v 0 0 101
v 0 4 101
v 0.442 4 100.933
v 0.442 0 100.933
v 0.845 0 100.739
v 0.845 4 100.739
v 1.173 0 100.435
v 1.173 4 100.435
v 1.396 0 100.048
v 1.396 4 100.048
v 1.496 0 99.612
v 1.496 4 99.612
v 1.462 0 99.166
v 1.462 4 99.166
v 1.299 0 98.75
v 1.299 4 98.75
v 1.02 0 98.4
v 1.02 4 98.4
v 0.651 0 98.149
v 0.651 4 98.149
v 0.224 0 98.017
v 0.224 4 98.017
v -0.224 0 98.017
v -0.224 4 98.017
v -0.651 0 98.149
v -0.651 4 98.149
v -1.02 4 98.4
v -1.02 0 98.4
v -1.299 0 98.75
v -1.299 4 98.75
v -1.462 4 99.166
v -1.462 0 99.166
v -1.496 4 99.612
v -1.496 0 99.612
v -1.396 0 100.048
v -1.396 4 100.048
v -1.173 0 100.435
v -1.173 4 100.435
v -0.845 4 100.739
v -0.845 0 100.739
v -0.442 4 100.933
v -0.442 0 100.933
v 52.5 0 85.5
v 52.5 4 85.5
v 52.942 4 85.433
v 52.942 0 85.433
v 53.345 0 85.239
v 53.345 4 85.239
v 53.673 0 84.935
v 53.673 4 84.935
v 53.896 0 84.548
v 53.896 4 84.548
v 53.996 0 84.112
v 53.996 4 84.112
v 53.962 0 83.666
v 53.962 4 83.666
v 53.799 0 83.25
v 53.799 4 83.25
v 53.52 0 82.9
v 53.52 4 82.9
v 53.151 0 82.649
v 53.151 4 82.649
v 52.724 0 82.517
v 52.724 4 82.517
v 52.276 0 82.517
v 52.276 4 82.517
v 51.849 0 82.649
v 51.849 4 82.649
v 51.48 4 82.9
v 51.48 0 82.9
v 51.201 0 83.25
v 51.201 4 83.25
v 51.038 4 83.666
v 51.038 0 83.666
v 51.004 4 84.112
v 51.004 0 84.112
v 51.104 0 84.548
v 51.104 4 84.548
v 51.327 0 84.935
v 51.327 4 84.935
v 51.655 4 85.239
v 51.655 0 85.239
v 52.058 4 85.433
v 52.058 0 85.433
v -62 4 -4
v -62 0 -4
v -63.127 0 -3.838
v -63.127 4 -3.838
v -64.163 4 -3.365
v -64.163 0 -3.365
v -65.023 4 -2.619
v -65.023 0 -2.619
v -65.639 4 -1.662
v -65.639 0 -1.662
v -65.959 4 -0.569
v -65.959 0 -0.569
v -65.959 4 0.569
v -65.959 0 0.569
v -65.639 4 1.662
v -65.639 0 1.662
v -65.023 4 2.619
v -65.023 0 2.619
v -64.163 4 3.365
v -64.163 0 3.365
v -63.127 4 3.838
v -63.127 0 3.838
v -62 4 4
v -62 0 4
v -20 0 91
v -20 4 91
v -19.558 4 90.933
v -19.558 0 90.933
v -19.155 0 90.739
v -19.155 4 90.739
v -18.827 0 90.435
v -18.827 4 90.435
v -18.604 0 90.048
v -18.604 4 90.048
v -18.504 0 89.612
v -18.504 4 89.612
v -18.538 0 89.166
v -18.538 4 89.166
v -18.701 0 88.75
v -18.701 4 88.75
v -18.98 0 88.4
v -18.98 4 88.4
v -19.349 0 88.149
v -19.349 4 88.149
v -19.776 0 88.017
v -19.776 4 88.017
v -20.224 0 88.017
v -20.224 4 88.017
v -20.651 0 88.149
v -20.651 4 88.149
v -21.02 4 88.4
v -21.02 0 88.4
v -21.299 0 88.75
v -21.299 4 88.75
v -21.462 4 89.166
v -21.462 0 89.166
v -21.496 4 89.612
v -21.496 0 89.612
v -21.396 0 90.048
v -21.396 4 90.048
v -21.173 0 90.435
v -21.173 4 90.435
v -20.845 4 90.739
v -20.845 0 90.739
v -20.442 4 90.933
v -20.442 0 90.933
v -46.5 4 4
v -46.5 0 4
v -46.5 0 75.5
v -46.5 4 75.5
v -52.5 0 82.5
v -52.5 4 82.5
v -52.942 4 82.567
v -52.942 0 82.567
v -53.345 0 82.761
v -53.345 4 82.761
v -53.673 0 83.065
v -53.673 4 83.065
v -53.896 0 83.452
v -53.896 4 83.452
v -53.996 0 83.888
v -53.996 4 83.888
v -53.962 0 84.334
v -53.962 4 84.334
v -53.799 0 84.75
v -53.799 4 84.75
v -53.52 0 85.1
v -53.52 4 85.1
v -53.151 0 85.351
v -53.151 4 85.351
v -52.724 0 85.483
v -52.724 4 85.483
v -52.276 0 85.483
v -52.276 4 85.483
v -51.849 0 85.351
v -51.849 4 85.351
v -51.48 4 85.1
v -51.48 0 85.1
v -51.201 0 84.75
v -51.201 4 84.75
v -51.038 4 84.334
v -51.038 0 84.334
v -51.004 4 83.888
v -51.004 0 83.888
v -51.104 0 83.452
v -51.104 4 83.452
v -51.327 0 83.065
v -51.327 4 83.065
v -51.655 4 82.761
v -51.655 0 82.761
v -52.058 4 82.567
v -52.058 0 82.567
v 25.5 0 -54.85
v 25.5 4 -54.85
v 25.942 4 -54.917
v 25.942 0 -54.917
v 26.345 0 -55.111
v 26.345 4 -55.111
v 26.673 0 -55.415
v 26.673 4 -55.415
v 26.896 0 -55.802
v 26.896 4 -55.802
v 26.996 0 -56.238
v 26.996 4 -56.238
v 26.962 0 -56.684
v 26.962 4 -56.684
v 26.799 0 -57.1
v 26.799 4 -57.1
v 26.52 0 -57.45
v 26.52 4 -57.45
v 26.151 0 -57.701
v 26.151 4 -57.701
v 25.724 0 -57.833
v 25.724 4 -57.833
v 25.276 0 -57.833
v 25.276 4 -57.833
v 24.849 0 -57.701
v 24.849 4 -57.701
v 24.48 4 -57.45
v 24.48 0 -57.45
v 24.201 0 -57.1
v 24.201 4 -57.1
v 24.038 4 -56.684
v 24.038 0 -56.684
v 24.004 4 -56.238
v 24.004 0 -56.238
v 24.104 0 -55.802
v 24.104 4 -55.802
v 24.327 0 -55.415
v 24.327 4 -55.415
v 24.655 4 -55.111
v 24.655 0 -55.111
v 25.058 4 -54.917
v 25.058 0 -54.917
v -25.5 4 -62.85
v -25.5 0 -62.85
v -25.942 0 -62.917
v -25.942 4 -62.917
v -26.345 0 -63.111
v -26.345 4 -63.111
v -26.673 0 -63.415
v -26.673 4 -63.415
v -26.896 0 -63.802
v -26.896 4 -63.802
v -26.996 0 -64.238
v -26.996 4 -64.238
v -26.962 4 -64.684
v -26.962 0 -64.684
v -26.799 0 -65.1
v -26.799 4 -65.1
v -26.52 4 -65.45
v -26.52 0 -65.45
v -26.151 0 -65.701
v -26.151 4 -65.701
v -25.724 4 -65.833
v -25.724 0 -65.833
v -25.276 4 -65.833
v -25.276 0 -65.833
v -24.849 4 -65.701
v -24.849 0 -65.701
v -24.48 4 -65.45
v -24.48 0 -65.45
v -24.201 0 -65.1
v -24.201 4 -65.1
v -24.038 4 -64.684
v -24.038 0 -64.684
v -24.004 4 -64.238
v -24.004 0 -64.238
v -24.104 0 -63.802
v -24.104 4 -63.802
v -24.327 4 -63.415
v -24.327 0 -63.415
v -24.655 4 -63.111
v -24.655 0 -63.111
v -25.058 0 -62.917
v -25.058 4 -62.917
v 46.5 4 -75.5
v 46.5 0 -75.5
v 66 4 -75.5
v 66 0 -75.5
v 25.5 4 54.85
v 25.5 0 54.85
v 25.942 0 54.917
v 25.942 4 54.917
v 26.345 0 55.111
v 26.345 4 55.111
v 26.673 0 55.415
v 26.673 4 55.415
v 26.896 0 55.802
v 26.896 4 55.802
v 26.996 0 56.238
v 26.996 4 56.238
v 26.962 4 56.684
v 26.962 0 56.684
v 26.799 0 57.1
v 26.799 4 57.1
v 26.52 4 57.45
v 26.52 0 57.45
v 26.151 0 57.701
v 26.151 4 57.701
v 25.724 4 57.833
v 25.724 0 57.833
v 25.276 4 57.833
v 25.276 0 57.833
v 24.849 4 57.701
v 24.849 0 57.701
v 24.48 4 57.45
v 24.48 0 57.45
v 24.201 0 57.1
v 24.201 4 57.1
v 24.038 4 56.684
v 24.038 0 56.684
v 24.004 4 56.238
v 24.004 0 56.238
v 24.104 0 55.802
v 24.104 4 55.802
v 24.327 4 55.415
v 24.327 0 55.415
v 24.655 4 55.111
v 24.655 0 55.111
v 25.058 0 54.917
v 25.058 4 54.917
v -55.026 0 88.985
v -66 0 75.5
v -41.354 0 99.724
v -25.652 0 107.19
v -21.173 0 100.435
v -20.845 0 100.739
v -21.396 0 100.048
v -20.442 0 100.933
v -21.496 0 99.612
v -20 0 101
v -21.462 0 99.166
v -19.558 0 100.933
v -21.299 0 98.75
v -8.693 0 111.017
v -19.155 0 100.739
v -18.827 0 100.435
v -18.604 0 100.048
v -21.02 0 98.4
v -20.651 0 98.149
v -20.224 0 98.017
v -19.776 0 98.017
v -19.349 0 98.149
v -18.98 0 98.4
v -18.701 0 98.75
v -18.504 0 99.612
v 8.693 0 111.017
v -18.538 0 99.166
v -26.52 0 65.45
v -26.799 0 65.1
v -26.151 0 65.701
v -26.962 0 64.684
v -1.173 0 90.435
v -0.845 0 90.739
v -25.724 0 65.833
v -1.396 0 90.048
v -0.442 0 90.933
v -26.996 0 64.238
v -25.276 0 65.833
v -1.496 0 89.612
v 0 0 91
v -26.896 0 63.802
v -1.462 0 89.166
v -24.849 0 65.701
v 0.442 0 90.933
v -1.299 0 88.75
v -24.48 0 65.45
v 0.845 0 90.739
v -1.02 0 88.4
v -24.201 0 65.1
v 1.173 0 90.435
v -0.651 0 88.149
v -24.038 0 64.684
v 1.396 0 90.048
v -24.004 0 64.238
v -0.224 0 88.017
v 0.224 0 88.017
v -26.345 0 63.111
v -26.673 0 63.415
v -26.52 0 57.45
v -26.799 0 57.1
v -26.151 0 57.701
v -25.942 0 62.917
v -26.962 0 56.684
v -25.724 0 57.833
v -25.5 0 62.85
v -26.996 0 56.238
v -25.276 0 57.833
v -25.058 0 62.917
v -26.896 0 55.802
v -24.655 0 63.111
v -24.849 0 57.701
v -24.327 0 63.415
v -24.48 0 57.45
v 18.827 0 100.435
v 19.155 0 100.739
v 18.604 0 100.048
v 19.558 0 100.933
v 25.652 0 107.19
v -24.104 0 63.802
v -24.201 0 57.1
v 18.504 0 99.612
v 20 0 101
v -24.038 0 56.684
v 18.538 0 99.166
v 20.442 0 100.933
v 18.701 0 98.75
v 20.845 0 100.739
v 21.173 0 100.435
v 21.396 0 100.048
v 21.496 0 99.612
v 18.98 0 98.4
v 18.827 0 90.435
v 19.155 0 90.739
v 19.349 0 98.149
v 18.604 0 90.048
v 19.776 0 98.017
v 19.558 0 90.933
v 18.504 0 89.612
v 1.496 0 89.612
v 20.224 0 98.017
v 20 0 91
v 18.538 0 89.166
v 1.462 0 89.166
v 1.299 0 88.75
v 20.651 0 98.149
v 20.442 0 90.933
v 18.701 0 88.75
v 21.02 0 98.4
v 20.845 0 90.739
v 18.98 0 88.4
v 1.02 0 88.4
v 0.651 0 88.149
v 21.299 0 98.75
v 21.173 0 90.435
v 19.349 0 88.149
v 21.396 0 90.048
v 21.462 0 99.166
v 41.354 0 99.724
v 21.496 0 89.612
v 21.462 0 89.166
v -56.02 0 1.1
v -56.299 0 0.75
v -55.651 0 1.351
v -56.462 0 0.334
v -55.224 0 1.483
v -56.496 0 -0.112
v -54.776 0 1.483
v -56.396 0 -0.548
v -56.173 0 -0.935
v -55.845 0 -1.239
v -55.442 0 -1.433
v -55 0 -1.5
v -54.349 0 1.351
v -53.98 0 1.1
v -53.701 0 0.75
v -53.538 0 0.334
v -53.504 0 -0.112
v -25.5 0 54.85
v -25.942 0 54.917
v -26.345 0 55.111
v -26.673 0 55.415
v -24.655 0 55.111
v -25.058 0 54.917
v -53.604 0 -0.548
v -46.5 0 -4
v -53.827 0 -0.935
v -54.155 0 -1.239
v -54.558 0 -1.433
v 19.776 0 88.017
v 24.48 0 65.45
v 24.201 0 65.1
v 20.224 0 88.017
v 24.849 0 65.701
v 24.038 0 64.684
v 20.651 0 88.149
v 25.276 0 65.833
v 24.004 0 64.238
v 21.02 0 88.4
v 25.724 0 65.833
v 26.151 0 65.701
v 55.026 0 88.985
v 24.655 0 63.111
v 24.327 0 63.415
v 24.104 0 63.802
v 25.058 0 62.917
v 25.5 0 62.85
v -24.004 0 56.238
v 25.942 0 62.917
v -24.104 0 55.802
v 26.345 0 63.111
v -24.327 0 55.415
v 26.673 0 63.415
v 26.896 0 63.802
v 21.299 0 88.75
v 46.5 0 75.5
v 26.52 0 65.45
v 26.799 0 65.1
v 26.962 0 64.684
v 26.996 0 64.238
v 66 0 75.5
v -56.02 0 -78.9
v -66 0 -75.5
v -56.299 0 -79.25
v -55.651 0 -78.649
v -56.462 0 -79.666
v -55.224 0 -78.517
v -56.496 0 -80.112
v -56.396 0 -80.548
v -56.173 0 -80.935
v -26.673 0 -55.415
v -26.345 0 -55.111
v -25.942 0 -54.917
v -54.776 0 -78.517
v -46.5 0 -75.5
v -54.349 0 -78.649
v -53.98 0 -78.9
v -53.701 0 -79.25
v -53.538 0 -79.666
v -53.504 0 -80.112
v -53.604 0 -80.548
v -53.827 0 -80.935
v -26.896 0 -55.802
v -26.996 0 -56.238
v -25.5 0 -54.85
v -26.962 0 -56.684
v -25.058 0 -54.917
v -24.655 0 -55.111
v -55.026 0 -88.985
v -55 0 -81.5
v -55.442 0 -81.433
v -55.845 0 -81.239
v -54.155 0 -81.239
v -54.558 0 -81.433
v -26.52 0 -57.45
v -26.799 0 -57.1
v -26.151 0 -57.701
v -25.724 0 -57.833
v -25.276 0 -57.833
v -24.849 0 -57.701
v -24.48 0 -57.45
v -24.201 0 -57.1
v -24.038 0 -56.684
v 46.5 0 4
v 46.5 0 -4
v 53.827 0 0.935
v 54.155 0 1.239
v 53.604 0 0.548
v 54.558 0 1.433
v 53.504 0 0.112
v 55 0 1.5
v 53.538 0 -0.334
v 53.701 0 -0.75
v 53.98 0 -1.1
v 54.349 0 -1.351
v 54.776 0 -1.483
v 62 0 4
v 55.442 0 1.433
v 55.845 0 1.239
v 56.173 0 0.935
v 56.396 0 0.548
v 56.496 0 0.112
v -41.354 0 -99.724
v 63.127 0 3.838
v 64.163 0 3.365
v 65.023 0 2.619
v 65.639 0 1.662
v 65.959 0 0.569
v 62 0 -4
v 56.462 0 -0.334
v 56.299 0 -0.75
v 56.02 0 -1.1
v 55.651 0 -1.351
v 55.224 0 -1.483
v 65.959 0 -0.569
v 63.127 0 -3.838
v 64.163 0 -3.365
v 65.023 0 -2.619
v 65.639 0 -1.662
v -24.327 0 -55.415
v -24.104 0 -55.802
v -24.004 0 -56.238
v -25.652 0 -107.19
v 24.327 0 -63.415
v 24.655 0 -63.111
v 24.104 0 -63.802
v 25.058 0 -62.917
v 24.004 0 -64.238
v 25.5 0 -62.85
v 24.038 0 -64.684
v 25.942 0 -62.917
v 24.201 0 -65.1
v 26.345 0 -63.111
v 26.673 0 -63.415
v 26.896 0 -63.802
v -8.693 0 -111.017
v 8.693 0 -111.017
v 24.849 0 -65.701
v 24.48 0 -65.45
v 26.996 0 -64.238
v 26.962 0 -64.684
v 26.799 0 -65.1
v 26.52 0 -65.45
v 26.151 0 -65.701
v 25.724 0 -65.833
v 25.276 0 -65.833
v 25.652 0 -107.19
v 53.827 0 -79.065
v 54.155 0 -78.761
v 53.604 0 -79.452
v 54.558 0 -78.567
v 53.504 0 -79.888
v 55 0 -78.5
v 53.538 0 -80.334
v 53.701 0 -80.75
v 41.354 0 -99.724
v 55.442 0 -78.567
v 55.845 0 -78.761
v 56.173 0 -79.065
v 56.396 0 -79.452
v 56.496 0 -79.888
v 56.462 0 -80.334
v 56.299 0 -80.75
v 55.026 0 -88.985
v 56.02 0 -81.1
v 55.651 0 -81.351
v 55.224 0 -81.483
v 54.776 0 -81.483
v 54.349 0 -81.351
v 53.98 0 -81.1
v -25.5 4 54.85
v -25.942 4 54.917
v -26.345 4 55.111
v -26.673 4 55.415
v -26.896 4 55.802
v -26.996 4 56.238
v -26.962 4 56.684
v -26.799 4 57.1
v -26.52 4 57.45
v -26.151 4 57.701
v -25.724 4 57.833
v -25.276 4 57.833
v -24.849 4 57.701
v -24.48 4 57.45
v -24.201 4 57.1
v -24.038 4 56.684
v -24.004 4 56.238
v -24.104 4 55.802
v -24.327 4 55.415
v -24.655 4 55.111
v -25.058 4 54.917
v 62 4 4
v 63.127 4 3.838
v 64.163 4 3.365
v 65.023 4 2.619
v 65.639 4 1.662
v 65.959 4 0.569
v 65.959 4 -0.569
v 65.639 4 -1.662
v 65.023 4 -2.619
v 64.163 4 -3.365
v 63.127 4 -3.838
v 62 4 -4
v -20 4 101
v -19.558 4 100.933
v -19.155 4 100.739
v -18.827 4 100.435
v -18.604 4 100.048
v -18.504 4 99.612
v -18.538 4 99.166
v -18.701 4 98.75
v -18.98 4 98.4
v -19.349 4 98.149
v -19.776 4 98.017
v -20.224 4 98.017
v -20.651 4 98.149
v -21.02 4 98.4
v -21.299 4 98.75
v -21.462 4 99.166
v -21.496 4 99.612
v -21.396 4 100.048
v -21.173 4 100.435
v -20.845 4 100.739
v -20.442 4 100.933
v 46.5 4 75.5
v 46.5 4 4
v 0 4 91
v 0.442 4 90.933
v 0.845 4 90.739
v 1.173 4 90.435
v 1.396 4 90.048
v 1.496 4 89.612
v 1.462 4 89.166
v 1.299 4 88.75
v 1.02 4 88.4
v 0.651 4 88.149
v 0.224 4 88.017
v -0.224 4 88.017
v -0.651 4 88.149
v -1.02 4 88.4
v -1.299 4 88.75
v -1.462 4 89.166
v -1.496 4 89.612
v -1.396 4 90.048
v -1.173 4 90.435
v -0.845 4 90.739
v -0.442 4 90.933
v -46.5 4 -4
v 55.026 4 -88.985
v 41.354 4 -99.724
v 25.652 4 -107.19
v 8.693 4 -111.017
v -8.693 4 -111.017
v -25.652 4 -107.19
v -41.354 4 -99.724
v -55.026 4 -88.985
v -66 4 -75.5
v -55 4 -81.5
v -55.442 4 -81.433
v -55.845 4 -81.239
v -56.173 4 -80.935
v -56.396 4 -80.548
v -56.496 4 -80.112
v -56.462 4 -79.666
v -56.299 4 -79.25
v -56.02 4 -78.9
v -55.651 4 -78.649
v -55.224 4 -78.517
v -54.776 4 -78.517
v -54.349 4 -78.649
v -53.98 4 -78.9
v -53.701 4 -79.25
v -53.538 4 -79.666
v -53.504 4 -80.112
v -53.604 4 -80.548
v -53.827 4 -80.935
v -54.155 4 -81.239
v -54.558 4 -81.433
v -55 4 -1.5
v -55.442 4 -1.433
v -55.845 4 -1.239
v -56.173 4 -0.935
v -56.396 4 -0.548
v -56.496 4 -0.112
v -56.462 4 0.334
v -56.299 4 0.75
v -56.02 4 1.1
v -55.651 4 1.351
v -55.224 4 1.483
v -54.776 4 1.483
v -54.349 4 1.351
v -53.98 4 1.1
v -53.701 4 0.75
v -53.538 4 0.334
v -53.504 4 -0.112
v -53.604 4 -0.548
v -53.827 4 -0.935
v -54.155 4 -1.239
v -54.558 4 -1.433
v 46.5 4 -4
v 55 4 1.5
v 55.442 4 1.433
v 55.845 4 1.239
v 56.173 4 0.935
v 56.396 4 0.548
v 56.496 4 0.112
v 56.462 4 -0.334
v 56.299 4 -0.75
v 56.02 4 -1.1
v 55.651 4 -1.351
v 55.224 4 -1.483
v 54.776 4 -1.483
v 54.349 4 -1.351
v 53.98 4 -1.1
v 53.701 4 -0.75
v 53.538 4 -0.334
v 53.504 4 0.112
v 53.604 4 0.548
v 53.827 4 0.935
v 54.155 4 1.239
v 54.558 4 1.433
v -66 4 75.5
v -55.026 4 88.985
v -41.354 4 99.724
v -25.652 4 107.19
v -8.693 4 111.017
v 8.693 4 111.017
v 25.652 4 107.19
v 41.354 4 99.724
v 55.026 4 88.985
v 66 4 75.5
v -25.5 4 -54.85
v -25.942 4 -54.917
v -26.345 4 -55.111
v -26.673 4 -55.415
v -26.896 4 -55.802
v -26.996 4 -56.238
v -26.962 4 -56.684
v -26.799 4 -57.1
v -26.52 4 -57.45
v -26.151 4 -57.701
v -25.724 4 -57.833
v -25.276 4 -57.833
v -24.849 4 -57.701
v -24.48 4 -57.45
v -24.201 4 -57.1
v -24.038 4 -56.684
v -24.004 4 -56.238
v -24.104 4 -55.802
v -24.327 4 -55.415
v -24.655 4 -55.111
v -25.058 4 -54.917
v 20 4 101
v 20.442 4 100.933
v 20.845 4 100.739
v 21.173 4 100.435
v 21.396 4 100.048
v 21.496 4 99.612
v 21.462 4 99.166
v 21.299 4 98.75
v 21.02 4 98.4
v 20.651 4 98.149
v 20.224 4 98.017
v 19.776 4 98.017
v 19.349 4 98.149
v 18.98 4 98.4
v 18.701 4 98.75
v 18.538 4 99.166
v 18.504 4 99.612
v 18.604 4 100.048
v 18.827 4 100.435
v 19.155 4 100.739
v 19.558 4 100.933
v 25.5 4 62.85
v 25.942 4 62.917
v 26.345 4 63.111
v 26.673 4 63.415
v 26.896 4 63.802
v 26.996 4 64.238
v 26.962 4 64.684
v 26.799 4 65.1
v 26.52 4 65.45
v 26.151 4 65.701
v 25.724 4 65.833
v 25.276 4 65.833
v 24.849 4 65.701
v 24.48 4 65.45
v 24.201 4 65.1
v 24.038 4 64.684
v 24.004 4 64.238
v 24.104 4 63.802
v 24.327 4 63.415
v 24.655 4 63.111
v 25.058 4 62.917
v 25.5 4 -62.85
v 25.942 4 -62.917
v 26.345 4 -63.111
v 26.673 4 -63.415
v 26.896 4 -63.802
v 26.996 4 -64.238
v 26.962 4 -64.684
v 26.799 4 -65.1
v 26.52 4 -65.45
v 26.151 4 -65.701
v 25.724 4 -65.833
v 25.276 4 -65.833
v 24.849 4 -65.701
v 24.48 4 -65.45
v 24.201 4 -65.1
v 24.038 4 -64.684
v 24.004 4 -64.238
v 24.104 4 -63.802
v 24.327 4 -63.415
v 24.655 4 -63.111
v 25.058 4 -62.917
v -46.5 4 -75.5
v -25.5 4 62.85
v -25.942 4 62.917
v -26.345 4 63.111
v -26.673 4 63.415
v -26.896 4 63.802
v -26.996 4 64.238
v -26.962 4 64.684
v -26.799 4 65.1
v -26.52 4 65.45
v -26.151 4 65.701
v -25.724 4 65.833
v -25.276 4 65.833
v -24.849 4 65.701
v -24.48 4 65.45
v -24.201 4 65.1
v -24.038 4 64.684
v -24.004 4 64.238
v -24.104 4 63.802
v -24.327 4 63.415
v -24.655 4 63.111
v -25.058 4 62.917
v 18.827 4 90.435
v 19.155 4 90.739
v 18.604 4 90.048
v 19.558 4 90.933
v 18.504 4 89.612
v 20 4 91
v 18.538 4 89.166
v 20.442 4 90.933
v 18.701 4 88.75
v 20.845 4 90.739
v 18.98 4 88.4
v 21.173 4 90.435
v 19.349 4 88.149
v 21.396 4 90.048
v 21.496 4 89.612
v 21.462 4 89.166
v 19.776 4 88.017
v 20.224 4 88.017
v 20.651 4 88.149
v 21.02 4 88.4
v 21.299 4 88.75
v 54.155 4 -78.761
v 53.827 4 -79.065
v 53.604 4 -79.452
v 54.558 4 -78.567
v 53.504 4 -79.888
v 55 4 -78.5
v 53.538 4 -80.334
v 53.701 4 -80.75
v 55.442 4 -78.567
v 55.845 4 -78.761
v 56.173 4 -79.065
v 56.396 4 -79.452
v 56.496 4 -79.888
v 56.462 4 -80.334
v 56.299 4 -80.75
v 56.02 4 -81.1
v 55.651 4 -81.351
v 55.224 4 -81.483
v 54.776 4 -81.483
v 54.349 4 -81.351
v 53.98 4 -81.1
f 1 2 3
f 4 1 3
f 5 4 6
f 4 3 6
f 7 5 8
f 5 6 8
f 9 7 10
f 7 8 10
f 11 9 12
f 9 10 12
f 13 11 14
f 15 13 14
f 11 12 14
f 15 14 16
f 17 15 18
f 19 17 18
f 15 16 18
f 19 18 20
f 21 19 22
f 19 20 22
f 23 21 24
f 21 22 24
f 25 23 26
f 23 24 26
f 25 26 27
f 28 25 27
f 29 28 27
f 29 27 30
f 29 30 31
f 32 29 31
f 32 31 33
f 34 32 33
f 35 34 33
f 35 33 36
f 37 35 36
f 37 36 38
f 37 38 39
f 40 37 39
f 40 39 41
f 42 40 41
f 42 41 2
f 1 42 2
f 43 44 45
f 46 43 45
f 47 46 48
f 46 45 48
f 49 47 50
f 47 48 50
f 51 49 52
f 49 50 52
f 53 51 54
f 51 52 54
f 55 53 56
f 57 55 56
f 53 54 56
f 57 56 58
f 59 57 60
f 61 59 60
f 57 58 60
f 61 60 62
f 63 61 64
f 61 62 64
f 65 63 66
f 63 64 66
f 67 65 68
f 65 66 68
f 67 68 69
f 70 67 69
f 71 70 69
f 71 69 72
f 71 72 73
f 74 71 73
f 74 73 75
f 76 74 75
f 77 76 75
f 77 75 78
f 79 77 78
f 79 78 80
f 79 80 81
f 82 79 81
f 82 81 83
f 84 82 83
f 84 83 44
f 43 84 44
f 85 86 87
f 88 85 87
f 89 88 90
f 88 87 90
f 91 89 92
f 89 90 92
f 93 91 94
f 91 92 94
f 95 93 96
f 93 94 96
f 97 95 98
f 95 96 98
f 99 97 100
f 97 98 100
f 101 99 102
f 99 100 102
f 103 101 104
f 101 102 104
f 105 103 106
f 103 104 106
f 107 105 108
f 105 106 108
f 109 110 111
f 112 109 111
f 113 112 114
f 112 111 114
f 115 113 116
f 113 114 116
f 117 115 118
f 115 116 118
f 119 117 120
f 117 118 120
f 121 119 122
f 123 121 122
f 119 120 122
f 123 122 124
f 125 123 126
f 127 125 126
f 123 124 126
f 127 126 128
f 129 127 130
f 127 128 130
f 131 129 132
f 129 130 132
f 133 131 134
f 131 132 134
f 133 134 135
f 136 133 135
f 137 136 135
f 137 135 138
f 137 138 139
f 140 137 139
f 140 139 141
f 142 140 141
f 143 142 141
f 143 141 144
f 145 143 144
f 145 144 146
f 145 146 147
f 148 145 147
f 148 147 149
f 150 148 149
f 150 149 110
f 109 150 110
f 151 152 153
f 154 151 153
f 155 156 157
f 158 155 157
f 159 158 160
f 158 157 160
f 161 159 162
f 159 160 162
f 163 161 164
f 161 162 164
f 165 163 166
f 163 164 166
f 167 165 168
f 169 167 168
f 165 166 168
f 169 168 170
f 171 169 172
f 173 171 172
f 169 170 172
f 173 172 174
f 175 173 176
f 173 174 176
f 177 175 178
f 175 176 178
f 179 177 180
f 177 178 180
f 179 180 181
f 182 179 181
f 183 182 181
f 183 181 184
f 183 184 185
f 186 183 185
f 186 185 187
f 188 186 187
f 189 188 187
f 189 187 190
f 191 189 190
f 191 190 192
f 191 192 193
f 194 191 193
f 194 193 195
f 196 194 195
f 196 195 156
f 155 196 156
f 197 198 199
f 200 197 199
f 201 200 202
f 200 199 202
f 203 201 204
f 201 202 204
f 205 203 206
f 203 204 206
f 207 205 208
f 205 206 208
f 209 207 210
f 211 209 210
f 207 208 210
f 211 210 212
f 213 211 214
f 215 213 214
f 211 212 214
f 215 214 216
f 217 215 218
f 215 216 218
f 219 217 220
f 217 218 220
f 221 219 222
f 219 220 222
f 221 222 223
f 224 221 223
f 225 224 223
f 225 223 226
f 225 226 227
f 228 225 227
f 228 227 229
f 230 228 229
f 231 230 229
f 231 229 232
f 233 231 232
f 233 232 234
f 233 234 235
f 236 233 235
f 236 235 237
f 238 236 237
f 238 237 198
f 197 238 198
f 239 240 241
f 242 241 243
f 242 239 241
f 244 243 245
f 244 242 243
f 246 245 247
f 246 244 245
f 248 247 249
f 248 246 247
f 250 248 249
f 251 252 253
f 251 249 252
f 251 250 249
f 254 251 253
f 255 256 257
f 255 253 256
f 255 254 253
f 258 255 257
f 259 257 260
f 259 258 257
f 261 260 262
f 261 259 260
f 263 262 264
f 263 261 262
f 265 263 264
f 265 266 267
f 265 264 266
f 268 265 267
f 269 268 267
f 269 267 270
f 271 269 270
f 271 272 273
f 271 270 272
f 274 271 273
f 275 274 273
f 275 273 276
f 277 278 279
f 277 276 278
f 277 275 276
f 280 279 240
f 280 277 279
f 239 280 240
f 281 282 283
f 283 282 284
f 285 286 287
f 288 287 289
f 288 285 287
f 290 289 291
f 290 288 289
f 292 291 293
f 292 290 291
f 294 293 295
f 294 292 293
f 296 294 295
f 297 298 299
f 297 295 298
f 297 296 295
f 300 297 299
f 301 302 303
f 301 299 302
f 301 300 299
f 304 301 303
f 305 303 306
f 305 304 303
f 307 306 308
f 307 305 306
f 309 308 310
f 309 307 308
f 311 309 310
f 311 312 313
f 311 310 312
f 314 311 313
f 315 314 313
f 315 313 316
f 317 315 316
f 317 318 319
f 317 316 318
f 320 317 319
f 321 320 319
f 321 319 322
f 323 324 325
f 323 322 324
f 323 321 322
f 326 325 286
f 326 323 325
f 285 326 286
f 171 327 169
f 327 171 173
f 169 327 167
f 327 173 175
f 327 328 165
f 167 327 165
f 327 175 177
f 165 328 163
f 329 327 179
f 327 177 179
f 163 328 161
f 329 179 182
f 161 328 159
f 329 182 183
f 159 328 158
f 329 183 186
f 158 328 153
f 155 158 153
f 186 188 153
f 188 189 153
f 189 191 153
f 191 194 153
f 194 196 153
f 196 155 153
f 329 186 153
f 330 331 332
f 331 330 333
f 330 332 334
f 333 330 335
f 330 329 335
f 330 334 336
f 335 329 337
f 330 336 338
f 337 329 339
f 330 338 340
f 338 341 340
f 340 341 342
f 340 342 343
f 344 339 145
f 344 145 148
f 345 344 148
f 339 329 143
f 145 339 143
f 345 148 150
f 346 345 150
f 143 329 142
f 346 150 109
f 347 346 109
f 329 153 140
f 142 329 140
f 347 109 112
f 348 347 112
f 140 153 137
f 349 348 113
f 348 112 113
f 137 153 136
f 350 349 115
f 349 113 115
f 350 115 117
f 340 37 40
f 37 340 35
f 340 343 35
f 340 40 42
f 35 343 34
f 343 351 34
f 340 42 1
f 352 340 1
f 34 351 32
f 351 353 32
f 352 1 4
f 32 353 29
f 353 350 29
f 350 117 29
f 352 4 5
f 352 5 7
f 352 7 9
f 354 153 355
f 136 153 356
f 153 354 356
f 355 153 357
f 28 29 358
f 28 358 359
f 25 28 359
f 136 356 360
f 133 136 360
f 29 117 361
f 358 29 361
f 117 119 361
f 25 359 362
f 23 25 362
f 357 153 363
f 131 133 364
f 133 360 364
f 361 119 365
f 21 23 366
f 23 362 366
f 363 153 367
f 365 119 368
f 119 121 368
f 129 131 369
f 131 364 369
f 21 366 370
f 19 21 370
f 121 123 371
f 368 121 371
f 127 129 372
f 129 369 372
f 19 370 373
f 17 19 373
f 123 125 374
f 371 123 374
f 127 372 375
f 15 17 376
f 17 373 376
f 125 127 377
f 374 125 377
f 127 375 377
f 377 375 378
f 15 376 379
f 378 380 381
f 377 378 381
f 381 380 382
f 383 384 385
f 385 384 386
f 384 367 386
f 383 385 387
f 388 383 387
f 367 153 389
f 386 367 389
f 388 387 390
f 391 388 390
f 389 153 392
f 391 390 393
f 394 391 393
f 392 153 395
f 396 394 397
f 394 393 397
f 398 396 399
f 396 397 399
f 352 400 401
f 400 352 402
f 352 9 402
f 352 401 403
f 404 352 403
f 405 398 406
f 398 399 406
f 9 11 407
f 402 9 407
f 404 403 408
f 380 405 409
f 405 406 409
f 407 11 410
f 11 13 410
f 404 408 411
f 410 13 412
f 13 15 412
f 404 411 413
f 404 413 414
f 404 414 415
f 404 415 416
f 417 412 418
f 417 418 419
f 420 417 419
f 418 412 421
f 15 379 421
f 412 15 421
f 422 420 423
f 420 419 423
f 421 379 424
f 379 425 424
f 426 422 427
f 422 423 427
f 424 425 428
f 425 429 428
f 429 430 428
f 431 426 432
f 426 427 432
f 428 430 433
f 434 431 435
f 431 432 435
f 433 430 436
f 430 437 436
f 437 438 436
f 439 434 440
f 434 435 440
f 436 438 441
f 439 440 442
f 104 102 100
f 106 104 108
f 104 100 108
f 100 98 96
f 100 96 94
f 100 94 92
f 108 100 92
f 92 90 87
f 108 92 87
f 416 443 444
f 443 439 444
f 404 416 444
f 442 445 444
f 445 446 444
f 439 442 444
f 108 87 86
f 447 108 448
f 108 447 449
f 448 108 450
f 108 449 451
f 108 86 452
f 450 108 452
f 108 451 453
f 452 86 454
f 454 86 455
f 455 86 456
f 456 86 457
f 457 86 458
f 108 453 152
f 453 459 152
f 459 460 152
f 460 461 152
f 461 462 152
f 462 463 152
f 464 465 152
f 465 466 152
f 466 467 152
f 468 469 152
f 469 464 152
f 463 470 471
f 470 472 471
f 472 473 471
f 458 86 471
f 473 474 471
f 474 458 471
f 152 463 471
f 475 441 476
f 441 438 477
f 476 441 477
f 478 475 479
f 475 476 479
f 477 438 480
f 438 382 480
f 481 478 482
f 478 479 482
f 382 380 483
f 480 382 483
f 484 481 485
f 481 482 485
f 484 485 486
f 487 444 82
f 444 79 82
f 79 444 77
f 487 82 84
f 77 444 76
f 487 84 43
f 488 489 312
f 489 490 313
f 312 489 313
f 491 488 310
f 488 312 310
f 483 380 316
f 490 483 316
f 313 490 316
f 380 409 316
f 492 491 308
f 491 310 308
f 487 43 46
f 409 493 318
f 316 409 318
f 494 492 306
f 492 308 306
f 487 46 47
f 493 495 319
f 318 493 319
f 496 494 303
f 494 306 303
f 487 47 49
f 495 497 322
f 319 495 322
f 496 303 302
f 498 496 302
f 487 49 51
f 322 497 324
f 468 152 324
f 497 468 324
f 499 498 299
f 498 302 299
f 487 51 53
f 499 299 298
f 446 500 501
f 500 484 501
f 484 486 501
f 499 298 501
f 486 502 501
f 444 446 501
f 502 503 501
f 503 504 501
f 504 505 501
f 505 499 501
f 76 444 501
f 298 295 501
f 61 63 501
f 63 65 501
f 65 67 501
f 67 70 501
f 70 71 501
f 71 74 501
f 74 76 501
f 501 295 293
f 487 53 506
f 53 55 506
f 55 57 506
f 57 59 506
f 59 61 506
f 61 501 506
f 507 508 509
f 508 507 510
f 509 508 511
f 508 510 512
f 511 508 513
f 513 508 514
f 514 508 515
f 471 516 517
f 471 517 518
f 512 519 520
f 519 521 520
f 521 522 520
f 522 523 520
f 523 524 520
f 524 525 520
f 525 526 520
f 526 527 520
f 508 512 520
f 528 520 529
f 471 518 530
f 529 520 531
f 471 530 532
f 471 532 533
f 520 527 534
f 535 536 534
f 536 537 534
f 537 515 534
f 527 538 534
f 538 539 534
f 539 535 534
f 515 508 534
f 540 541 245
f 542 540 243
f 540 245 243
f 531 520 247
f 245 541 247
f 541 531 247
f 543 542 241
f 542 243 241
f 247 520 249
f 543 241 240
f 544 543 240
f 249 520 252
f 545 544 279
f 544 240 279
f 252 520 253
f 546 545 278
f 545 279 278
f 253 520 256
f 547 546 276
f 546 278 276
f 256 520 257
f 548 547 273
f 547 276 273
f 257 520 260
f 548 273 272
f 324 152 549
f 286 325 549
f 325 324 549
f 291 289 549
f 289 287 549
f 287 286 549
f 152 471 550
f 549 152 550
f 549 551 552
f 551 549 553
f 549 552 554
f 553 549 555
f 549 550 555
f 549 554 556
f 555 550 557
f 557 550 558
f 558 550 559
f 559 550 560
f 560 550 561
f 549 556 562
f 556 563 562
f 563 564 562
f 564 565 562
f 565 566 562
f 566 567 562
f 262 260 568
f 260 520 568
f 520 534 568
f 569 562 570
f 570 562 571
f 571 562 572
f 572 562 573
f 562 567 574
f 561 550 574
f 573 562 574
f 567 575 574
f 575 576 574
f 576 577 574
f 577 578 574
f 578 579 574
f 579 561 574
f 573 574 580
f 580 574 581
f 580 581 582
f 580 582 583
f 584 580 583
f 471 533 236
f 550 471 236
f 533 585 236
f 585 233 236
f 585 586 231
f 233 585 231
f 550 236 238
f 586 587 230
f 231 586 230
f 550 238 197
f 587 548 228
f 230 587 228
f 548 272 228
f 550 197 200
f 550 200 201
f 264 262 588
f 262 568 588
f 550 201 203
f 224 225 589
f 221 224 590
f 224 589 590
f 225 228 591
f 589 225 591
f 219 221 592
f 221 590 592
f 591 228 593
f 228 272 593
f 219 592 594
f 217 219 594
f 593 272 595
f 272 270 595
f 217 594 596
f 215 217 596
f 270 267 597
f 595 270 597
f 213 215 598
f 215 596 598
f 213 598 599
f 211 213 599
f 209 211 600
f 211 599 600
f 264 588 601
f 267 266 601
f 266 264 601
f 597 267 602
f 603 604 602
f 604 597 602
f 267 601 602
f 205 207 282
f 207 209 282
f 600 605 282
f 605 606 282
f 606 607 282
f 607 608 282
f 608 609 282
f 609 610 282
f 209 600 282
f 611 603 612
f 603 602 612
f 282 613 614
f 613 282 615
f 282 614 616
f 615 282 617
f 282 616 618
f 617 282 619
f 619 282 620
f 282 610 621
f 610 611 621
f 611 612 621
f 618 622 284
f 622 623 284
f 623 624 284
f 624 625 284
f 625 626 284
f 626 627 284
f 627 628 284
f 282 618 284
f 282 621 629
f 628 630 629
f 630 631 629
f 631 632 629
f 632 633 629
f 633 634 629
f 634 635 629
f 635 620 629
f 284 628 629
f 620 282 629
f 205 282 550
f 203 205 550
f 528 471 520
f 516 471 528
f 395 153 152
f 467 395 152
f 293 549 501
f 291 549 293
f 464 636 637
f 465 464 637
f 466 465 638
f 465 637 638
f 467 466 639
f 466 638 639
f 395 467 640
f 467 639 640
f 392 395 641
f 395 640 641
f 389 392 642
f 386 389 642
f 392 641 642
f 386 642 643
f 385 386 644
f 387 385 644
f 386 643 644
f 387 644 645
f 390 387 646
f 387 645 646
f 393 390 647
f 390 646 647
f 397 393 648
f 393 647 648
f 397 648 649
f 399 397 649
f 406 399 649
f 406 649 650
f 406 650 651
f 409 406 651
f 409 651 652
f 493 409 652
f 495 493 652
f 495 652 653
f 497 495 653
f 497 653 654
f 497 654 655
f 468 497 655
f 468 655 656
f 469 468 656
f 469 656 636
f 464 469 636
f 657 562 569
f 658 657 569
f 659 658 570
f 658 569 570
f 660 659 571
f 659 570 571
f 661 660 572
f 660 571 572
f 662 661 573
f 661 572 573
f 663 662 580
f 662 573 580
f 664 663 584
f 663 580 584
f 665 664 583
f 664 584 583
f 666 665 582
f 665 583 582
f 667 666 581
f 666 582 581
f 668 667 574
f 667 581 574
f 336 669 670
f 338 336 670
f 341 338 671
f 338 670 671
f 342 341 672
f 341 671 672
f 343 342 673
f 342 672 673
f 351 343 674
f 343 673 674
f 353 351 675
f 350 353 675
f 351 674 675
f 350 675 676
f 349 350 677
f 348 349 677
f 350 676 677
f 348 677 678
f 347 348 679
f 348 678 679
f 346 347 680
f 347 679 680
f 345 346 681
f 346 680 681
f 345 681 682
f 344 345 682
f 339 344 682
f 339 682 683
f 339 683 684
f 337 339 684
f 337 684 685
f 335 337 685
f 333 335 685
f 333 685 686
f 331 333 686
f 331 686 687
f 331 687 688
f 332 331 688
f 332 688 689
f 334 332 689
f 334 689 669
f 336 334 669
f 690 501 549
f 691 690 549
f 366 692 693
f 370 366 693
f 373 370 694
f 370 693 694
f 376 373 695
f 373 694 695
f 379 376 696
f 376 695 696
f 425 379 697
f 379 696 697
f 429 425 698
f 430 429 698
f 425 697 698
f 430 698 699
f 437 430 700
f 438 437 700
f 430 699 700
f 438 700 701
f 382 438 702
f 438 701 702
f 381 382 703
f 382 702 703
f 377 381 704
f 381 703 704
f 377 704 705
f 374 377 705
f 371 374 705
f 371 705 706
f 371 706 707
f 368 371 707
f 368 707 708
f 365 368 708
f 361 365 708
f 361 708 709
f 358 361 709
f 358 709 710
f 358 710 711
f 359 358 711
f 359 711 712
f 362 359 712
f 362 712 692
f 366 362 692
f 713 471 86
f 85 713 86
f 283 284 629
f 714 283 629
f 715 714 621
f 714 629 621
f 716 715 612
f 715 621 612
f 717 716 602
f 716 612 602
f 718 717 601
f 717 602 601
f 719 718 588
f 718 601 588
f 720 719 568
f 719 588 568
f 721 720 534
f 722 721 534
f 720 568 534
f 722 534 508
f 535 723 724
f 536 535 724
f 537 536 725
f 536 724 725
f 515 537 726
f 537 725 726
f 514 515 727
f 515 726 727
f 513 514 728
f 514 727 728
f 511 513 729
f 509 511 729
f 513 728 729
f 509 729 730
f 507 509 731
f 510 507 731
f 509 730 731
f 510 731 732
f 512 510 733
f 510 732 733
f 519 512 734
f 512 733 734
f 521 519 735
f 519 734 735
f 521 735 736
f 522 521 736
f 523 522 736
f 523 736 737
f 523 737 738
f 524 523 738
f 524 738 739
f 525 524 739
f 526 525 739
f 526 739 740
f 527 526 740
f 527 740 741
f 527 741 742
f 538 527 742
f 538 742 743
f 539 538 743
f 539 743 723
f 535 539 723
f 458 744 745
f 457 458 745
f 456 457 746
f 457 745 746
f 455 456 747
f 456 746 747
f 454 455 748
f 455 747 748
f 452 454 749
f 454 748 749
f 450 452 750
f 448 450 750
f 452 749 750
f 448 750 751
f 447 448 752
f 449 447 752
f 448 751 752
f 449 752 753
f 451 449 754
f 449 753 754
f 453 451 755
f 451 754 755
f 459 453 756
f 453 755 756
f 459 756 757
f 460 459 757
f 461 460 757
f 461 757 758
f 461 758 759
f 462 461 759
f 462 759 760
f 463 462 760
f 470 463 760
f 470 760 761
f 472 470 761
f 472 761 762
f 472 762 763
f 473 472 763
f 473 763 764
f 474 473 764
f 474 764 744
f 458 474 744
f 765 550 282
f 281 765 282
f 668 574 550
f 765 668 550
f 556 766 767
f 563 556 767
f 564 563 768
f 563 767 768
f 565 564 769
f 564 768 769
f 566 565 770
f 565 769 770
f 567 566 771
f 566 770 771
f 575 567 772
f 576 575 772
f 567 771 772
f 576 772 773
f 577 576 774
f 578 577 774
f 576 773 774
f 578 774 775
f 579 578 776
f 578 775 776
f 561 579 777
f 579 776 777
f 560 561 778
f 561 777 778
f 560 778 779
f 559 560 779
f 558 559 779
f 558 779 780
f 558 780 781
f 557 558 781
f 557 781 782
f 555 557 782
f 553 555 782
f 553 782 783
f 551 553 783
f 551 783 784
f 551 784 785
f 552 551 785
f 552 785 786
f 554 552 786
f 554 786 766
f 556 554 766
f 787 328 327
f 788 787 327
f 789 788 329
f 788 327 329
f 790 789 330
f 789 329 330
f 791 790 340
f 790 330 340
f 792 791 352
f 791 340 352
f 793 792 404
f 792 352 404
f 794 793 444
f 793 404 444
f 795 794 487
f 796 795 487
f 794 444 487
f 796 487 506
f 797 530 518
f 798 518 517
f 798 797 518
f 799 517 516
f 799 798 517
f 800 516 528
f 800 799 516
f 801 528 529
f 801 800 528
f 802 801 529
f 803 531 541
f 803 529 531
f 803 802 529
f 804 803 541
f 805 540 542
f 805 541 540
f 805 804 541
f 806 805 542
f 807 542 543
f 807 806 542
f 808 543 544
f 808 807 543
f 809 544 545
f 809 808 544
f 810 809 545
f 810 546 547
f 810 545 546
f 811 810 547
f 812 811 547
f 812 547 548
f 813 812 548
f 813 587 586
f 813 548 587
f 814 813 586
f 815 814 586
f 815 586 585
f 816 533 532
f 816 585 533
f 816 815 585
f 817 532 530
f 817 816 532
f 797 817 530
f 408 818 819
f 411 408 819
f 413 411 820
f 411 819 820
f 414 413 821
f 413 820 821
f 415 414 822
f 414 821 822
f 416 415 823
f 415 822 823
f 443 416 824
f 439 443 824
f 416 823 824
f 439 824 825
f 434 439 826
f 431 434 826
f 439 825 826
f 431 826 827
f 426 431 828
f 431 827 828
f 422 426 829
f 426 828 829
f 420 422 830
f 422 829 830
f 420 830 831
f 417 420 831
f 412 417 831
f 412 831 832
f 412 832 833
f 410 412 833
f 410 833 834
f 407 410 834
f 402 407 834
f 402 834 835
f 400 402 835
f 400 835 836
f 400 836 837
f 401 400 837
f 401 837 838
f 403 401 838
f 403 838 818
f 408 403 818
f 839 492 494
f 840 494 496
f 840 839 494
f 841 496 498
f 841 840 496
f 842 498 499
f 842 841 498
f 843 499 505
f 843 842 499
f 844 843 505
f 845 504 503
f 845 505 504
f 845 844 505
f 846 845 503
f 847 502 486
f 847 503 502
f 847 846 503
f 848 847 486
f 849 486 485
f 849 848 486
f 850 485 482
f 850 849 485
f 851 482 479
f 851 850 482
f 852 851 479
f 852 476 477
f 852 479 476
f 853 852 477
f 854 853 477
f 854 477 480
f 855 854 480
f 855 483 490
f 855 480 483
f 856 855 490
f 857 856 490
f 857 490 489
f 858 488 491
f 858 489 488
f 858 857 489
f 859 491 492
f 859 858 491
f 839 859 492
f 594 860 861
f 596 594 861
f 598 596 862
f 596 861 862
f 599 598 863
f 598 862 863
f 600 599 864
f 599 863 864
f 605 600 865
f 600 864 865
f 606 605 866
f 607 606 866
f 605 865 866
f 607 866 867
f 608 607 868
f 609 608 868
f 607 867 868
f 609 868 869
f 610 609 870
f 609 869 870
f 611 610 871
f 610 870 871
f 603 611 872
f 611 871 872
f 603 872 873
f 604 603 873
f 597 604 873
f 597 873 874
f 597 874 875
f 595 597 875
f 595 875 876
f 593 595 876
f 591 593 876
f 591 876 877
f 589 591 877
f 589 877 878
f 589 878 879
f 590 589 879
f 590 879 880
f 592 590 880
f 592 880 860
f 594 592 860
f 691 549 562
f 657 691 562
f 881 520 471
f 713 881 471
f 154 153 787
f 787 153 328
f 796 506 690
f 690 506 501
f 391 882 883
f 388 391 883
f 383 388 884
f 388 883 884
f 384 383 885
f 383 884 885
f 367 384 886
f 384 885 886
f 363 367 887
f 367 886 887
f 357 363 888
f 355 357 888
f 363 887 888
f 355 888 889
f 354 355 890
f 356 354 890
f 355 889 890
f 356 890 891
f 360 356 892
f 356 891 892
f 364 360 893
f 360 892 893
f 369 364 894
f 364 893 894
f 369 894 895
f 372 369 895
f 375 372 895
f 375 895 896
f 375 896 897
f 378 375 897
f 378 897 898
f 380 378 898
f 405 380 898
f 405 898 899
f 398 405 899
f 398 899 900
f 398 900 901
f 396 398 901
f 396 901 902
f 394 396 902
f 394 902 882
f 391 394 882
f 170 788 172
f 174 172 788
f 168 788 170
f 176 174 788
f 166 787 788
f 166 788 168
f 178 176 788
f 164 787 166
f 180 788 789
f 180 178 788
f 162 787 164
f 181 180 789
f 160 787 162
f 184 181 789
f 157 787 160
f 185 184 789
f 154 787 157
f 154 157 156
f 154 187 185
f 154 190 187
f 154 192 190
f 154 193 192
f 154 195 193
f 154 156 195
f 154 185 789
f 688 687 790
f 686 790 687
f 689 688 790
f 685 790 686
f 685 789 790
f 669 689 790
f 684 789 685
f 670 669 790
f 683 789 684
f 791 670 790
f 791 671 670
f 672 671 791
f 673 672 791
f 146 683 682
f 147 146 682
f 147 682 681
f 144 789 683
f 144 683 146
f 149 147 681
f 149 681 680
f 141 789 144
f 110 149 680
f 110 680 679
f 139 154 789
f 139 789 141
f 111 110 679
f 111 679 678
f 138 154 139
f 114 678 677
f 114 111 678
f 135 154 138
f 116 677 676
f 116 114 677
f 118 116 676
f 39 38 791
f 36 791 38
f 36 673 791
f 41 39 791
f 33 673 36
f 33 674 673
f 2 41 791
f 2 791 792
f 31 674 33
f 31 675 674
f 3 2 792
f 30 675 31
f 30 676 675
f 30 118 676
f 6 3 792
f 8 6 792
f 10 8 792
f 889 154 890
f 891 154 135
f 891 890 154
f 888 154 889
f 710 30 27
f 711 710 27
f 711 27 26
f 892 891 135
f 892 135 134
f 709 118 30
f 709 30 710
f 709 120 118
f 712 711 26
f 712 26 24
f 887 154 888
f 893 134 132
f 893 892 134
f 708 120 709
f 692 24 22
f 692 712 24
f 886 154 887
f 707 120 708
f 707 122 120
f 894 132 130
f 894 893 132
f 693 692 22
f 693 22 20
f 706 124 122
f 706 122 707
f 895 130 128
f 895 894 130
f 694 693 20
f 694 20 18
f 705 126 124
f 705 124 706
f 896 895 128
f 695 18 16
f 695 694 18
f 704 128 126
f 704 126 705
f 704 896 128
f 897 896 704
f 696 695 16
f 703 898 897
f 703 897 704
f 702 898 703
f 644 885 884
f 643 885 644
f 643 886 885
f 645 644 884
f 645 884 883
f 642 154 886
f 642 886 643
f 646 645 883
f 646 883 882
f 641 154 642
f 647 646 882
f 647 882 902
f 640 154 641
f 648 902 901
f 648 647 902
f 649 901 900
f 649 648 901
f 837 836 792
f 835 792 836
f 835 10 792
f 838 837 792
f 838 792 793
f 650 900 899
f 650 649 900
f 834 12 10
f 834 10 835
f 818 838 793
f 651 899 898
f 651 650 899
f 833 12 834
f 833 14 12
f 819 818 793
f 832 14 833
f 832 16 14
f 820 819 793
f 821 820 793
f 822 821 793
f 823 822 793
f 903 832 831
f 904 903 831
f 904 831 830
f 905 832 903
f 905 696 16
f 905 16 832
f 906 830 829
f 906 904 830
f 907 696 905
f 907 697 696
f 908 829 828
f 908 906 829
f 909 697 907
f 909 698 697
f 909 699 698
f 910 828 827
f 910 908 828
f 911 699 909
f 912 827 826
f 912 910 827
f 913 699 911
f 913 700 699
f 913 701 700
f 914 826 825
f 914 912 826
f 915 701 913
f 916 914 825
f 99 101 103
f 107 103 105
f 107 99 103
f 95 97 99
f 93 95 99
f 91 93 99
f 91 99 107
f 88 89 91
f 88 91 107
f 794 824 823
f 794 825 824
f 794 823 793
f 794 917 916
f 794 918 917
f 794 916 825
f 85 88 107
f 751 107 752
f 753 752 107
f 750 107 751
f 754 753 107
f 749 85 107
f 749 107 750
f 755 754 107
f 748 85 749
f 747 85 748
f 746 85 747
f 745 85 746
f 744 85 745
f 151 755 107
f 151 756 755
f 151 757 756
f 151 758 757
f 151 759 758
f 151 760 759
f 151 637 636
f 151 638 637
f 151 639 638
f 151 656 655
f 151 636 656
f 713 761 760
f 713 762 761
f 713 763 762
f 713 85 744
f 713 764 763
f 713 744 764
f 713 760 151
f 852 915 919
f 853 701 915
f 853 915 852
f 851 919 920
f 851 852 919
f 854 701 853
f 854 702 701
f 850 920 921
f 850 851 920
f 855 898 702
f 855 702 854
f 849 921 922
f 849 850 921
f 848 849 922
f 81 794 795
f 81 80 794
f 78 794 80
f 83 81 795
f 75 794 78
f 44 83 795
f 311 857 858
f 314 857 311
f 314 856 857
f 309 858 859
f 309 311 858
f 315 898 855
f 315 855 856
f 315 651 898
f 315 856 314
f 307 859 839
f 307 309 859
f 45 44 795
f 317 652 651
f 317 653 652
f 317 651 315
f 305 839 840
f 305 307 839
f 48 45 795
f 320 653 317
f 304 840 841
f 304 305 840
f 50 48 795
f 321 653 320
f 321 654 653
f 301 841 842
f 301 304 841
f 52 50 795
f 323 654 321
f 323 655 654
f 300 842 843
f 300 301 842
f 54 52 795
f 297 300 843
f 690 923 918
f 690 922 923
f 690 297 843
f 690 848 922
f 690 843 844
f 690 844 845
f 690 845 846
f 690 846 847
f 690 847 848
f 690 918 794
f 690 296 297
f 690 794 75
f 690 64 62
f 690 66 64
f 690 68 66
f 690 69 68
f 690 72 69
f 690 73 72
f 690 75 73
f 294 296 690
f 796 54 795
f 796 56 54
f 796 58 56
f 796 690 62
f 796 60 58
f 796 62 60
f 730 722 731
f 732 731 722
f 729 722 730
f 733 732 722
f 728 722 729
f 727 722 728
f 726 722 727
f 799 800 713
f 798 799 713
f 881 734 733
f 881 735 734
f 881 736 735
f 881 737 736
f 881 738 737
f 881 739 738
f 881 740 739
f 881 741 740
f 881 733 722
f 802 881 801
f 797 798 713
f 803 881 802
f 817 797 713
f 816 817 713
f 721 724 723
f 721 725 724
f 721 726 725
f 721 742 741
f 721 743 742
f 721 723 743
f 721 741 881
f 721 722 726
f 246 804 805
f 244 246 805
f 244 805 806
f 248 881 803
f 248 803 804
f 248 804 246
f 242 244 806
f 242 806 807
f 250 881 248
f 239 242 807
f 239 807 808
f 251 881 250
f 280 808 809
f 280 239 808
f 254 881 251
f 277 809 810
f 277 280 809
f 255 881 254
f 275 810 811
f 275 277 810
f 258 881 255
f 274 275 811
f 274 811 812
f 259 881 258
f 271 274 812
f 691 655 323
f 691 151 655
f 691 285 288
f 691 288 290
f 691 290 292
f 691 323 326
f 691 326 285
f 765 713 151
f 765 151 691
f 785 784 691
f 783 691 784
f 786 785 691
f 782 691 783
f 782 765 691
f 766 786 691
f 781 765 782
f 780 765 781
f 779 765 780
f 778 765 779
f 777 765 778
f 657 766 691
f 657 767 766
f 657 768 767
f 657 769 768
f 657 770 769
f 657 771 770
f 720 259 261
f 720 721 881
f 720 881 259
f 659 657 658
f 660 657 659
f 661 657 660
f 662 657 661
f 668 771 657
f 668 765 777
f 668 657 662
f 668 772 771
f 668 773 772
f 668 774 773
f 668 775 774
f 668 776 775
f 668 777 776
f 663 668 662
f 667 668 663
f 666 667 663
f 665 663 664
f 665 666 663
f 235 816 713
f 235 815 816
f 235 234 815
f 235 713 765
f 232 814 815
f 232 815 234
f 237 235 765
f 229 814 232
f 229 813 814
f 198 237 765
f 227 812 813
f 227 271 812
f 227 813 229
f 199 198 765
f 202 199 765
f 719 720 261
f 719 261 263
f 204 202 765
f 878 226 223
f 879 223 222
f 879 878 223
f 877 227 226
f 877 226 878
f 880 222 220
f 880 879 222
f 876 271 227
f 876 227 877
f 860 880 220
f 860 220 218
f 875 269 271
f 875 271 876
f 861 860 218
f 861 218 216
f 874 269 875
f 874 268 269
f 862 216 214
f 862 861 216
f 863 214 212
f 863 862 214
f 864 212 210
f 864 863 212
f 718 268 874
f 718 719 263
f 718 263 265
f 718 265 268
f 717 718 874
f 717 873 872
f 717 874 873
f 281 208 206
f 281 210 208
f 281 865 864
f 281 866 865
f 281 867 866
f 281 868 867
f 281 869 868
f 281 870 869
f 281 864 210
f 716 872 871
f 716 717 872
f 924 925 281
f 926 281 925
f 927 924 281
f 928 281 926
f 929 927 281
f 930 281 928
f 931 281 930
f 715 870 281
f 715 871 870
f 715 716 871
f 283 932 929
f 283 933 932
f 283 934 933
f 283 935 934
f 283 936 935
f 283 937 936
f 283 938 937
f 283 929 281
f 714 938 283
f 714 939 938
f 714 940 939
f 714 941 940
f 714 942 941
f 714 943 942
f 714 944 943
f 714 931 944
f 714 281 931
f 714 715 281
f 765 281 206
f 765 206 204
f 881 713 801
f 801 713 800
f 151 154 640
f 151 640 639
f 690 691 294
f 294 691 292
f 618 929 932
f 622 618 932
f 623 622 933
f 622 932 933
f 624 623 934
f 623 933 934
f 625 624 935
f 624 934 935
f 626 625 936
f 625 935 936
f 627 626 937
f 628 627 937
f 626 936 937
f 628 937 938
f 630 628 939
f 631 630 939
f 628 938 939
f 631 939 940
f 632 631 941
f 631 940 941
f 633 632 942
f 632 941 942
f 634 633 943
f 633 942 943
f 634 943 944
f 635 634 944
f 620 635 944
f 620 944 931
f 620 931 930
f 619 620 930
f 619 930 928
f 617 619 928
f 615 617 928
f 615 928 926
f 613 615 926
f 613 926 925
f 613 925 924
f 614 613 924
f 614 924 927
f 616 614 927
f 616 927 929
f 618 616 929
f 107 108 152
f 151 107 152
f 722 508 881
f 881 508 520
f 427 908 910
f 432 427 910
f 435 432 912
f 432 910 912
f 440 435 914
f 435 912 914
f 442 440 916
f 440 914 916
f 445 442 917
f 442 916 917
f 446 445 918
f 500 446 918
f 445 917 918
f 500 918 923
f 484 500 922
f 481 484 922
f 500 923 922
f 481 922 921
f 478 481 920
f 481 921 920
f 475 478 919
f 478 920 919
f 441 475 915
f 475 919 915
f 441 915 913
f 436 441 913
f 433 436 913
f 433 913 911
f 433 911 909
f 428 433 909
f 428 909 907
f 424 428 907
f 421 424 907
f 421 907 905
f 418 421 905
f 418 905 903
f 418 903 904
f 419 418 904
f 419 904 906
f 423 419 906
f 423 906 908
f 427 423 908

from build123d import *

# Parameters (mm, degrees)
PLATE_DEPTH             = 4
SKETCH2_R               = 1.5
PLATE_MOUNTINGS_DEPTH   = 130.631207662
SKETCH3_R               = 1.5
LIGHT_SENSOR_DEPTH      = 130.631207662
SKETCH4_R               = 1.5
CUT_EXTRUDE3_DEPTH      = 130.631207662
MIRROR2_COPY_1_SKETCH_R = 1.5
MIRROR2_COPY_1_DEPTH    = 130.631207662


with BuildPart() as part:
    # Sketch1 → Plate (new body)
    with BuildSketch(Plane(origin=(0, 0, 0), x_dir=(1, 0, 0), z_dir=(0, 1, 0))):
        with BuildLine():
            Line((62, 4), (46.5, 4))
            Line((46.5, 4), (46.5, 75.5))
            Line((46.5, 75.5), (66, 75.5))
            ThreePointArc((66, 75.5), (0, 111.5), (-66, 75.5))
            Line((-66, 75.5), (-46.5, 75.5))
            Line((-46.5, 75.5), (-46.5, 4))
            Line((-46.5, 4), (-62, 4))
            ThreePointArc((-62, 4), (-66, 0), (-62, -4))
            Line((-62, -4), (-46.5, -4))
            Line((-46.5, -4), (-46.5, -75.5))
            Line((-46.5, -75.5), (-66, -75.5))
            ThreePointArc((-66, -75.5), (0, -111.5), (66, -75.5))
            Line((66, -75.5), (46.5, -75.5))
            Line((46.5, -75.5), (46.5, -4))
            Line((46.5, -4), (62, -4))
            ThreePointArc((62, -4), (66, 0), (62, 4))
        make_face()
    extrude(amount=PLATE_DEPTH)

    # Sketch2 → Plate mountings (cut, through all)
    with BuildSketch(Plane(origin=(0, 4, 0), x_dir=(1, 0, 0), z_dir=(0, 1, 0))):
        with Locations(Location((55, 0, 0), (0, 0, 270))):
            Circle(SKETCH2_R)
        with Locations(Location((55, 80, 0), (0, 0, 270))):
            Circle(SKETCH2_R)
        with Locations(Location((-55, 0, 0), (0, 0, 90))):
            Circle(SKETCH2_R)
        with Locations(Location((-55, 80, 0), (0, 0, 90))):
            Circle(SKETCH2_R)
        with Locations(Location((52.5, -84, 0), (0, 0, 270))):
            Circle(SKETCH2_R)
        with Locations(Location((-52.5, -84, 0), (0, 0, 90))):
            Circle(SKETCH2_R)
    extrude(amount=-PLATE_MOUNTINGS_DEPTH, mode=Mode.SUBTRACT)

    # Sketch3 → Light sensor (cut, through all)
    with BuildSketch(Plane(origin=(0, 4, 0), x_dir=(1, 0, 0), z_dir=(0, 1, 0))):
        with Locations(Location((-20, -89.5, 0), (0, 0, 270))):
            Circle(SKETCH3_R)
        with Locations(Location((0, -89.5, 0), (0, 0, 270))):
            Circle(SKETCH3_R)
        with Locations(Location((20, -89.5, 0), (0, 0, 270))):
            Circle(SKETCH3_R)
        with Locations(Location((0, -99.5, 0), (0, 0, 270))):
            Circle(SKETCH3_R)
        with Locations(Location((20, -99.5, 0), (0, 0, 270))):
            Circle(SKETCH3_R)
        with Locations(Location((-20, -99.5, 0), (0, 0, 270))):
            Circle(SKETCH3_R)
    extrude(amount=-LIGHT_SENSOR_DEPTH, mode=Mode.SUBTRACT)

    # Sketch4 → Cut-Extrude3 (cut, through all)
    with BuildSketch(Plane(origin=(0, 4, 0), x_dir=(1, 0, 0), z_dir=(0, 1, 0))):
        with Locations(Location((25.5, 64.35, 0), (0, 0, 270))):
            Circle(SKETCH4_R)
        with Locations(Location((25.5, 56.35, 0), (0, 0, 270))):
            Circle(SKETCH4_R)
    cut_extrude3 = extrude(amount=-CUT_EXTRUDE3_DEPTH, mode=Mode.SUBTRACT)

    # Mirror1: Cut-Extrude3 across plane
    add(cut_extrude3.mirror(Plane(origin=(0, 0, 0), x_dir=(0, 0, 1), z_dir=(1, 0, 0))), mode=Mode.SUBTRACT)

    # Mirror2: Cut-Extrude3 across plane
    add(cut_extrude3.mirror(Plane.XY), mode=Mode.SUBTRACT)

    # Mirror2 copy 1 sketch → Mirror2 copy 1 (cut, through all)
    with BuildSketch(Plane(origin=(0, 4, 0), x_dir=(-1, 0, 0), z_dir=(0, 1, 0))):
        with Locations(Location((25.5, 64.35, 0), (0, 0, 270))):
            Circle(MIRROR2_COPY_1_SKETCH_R)
        with Locations(Location((25.5, 56.35, 0), (0, 0, 270))):
            Circle(MIRROR2_COPY_1_SKETCH_R)
    extrude(amount=-MIRROR2_COPY_1_DEPTH, mode=Mode.SUBTRACT)


solid = part.part
